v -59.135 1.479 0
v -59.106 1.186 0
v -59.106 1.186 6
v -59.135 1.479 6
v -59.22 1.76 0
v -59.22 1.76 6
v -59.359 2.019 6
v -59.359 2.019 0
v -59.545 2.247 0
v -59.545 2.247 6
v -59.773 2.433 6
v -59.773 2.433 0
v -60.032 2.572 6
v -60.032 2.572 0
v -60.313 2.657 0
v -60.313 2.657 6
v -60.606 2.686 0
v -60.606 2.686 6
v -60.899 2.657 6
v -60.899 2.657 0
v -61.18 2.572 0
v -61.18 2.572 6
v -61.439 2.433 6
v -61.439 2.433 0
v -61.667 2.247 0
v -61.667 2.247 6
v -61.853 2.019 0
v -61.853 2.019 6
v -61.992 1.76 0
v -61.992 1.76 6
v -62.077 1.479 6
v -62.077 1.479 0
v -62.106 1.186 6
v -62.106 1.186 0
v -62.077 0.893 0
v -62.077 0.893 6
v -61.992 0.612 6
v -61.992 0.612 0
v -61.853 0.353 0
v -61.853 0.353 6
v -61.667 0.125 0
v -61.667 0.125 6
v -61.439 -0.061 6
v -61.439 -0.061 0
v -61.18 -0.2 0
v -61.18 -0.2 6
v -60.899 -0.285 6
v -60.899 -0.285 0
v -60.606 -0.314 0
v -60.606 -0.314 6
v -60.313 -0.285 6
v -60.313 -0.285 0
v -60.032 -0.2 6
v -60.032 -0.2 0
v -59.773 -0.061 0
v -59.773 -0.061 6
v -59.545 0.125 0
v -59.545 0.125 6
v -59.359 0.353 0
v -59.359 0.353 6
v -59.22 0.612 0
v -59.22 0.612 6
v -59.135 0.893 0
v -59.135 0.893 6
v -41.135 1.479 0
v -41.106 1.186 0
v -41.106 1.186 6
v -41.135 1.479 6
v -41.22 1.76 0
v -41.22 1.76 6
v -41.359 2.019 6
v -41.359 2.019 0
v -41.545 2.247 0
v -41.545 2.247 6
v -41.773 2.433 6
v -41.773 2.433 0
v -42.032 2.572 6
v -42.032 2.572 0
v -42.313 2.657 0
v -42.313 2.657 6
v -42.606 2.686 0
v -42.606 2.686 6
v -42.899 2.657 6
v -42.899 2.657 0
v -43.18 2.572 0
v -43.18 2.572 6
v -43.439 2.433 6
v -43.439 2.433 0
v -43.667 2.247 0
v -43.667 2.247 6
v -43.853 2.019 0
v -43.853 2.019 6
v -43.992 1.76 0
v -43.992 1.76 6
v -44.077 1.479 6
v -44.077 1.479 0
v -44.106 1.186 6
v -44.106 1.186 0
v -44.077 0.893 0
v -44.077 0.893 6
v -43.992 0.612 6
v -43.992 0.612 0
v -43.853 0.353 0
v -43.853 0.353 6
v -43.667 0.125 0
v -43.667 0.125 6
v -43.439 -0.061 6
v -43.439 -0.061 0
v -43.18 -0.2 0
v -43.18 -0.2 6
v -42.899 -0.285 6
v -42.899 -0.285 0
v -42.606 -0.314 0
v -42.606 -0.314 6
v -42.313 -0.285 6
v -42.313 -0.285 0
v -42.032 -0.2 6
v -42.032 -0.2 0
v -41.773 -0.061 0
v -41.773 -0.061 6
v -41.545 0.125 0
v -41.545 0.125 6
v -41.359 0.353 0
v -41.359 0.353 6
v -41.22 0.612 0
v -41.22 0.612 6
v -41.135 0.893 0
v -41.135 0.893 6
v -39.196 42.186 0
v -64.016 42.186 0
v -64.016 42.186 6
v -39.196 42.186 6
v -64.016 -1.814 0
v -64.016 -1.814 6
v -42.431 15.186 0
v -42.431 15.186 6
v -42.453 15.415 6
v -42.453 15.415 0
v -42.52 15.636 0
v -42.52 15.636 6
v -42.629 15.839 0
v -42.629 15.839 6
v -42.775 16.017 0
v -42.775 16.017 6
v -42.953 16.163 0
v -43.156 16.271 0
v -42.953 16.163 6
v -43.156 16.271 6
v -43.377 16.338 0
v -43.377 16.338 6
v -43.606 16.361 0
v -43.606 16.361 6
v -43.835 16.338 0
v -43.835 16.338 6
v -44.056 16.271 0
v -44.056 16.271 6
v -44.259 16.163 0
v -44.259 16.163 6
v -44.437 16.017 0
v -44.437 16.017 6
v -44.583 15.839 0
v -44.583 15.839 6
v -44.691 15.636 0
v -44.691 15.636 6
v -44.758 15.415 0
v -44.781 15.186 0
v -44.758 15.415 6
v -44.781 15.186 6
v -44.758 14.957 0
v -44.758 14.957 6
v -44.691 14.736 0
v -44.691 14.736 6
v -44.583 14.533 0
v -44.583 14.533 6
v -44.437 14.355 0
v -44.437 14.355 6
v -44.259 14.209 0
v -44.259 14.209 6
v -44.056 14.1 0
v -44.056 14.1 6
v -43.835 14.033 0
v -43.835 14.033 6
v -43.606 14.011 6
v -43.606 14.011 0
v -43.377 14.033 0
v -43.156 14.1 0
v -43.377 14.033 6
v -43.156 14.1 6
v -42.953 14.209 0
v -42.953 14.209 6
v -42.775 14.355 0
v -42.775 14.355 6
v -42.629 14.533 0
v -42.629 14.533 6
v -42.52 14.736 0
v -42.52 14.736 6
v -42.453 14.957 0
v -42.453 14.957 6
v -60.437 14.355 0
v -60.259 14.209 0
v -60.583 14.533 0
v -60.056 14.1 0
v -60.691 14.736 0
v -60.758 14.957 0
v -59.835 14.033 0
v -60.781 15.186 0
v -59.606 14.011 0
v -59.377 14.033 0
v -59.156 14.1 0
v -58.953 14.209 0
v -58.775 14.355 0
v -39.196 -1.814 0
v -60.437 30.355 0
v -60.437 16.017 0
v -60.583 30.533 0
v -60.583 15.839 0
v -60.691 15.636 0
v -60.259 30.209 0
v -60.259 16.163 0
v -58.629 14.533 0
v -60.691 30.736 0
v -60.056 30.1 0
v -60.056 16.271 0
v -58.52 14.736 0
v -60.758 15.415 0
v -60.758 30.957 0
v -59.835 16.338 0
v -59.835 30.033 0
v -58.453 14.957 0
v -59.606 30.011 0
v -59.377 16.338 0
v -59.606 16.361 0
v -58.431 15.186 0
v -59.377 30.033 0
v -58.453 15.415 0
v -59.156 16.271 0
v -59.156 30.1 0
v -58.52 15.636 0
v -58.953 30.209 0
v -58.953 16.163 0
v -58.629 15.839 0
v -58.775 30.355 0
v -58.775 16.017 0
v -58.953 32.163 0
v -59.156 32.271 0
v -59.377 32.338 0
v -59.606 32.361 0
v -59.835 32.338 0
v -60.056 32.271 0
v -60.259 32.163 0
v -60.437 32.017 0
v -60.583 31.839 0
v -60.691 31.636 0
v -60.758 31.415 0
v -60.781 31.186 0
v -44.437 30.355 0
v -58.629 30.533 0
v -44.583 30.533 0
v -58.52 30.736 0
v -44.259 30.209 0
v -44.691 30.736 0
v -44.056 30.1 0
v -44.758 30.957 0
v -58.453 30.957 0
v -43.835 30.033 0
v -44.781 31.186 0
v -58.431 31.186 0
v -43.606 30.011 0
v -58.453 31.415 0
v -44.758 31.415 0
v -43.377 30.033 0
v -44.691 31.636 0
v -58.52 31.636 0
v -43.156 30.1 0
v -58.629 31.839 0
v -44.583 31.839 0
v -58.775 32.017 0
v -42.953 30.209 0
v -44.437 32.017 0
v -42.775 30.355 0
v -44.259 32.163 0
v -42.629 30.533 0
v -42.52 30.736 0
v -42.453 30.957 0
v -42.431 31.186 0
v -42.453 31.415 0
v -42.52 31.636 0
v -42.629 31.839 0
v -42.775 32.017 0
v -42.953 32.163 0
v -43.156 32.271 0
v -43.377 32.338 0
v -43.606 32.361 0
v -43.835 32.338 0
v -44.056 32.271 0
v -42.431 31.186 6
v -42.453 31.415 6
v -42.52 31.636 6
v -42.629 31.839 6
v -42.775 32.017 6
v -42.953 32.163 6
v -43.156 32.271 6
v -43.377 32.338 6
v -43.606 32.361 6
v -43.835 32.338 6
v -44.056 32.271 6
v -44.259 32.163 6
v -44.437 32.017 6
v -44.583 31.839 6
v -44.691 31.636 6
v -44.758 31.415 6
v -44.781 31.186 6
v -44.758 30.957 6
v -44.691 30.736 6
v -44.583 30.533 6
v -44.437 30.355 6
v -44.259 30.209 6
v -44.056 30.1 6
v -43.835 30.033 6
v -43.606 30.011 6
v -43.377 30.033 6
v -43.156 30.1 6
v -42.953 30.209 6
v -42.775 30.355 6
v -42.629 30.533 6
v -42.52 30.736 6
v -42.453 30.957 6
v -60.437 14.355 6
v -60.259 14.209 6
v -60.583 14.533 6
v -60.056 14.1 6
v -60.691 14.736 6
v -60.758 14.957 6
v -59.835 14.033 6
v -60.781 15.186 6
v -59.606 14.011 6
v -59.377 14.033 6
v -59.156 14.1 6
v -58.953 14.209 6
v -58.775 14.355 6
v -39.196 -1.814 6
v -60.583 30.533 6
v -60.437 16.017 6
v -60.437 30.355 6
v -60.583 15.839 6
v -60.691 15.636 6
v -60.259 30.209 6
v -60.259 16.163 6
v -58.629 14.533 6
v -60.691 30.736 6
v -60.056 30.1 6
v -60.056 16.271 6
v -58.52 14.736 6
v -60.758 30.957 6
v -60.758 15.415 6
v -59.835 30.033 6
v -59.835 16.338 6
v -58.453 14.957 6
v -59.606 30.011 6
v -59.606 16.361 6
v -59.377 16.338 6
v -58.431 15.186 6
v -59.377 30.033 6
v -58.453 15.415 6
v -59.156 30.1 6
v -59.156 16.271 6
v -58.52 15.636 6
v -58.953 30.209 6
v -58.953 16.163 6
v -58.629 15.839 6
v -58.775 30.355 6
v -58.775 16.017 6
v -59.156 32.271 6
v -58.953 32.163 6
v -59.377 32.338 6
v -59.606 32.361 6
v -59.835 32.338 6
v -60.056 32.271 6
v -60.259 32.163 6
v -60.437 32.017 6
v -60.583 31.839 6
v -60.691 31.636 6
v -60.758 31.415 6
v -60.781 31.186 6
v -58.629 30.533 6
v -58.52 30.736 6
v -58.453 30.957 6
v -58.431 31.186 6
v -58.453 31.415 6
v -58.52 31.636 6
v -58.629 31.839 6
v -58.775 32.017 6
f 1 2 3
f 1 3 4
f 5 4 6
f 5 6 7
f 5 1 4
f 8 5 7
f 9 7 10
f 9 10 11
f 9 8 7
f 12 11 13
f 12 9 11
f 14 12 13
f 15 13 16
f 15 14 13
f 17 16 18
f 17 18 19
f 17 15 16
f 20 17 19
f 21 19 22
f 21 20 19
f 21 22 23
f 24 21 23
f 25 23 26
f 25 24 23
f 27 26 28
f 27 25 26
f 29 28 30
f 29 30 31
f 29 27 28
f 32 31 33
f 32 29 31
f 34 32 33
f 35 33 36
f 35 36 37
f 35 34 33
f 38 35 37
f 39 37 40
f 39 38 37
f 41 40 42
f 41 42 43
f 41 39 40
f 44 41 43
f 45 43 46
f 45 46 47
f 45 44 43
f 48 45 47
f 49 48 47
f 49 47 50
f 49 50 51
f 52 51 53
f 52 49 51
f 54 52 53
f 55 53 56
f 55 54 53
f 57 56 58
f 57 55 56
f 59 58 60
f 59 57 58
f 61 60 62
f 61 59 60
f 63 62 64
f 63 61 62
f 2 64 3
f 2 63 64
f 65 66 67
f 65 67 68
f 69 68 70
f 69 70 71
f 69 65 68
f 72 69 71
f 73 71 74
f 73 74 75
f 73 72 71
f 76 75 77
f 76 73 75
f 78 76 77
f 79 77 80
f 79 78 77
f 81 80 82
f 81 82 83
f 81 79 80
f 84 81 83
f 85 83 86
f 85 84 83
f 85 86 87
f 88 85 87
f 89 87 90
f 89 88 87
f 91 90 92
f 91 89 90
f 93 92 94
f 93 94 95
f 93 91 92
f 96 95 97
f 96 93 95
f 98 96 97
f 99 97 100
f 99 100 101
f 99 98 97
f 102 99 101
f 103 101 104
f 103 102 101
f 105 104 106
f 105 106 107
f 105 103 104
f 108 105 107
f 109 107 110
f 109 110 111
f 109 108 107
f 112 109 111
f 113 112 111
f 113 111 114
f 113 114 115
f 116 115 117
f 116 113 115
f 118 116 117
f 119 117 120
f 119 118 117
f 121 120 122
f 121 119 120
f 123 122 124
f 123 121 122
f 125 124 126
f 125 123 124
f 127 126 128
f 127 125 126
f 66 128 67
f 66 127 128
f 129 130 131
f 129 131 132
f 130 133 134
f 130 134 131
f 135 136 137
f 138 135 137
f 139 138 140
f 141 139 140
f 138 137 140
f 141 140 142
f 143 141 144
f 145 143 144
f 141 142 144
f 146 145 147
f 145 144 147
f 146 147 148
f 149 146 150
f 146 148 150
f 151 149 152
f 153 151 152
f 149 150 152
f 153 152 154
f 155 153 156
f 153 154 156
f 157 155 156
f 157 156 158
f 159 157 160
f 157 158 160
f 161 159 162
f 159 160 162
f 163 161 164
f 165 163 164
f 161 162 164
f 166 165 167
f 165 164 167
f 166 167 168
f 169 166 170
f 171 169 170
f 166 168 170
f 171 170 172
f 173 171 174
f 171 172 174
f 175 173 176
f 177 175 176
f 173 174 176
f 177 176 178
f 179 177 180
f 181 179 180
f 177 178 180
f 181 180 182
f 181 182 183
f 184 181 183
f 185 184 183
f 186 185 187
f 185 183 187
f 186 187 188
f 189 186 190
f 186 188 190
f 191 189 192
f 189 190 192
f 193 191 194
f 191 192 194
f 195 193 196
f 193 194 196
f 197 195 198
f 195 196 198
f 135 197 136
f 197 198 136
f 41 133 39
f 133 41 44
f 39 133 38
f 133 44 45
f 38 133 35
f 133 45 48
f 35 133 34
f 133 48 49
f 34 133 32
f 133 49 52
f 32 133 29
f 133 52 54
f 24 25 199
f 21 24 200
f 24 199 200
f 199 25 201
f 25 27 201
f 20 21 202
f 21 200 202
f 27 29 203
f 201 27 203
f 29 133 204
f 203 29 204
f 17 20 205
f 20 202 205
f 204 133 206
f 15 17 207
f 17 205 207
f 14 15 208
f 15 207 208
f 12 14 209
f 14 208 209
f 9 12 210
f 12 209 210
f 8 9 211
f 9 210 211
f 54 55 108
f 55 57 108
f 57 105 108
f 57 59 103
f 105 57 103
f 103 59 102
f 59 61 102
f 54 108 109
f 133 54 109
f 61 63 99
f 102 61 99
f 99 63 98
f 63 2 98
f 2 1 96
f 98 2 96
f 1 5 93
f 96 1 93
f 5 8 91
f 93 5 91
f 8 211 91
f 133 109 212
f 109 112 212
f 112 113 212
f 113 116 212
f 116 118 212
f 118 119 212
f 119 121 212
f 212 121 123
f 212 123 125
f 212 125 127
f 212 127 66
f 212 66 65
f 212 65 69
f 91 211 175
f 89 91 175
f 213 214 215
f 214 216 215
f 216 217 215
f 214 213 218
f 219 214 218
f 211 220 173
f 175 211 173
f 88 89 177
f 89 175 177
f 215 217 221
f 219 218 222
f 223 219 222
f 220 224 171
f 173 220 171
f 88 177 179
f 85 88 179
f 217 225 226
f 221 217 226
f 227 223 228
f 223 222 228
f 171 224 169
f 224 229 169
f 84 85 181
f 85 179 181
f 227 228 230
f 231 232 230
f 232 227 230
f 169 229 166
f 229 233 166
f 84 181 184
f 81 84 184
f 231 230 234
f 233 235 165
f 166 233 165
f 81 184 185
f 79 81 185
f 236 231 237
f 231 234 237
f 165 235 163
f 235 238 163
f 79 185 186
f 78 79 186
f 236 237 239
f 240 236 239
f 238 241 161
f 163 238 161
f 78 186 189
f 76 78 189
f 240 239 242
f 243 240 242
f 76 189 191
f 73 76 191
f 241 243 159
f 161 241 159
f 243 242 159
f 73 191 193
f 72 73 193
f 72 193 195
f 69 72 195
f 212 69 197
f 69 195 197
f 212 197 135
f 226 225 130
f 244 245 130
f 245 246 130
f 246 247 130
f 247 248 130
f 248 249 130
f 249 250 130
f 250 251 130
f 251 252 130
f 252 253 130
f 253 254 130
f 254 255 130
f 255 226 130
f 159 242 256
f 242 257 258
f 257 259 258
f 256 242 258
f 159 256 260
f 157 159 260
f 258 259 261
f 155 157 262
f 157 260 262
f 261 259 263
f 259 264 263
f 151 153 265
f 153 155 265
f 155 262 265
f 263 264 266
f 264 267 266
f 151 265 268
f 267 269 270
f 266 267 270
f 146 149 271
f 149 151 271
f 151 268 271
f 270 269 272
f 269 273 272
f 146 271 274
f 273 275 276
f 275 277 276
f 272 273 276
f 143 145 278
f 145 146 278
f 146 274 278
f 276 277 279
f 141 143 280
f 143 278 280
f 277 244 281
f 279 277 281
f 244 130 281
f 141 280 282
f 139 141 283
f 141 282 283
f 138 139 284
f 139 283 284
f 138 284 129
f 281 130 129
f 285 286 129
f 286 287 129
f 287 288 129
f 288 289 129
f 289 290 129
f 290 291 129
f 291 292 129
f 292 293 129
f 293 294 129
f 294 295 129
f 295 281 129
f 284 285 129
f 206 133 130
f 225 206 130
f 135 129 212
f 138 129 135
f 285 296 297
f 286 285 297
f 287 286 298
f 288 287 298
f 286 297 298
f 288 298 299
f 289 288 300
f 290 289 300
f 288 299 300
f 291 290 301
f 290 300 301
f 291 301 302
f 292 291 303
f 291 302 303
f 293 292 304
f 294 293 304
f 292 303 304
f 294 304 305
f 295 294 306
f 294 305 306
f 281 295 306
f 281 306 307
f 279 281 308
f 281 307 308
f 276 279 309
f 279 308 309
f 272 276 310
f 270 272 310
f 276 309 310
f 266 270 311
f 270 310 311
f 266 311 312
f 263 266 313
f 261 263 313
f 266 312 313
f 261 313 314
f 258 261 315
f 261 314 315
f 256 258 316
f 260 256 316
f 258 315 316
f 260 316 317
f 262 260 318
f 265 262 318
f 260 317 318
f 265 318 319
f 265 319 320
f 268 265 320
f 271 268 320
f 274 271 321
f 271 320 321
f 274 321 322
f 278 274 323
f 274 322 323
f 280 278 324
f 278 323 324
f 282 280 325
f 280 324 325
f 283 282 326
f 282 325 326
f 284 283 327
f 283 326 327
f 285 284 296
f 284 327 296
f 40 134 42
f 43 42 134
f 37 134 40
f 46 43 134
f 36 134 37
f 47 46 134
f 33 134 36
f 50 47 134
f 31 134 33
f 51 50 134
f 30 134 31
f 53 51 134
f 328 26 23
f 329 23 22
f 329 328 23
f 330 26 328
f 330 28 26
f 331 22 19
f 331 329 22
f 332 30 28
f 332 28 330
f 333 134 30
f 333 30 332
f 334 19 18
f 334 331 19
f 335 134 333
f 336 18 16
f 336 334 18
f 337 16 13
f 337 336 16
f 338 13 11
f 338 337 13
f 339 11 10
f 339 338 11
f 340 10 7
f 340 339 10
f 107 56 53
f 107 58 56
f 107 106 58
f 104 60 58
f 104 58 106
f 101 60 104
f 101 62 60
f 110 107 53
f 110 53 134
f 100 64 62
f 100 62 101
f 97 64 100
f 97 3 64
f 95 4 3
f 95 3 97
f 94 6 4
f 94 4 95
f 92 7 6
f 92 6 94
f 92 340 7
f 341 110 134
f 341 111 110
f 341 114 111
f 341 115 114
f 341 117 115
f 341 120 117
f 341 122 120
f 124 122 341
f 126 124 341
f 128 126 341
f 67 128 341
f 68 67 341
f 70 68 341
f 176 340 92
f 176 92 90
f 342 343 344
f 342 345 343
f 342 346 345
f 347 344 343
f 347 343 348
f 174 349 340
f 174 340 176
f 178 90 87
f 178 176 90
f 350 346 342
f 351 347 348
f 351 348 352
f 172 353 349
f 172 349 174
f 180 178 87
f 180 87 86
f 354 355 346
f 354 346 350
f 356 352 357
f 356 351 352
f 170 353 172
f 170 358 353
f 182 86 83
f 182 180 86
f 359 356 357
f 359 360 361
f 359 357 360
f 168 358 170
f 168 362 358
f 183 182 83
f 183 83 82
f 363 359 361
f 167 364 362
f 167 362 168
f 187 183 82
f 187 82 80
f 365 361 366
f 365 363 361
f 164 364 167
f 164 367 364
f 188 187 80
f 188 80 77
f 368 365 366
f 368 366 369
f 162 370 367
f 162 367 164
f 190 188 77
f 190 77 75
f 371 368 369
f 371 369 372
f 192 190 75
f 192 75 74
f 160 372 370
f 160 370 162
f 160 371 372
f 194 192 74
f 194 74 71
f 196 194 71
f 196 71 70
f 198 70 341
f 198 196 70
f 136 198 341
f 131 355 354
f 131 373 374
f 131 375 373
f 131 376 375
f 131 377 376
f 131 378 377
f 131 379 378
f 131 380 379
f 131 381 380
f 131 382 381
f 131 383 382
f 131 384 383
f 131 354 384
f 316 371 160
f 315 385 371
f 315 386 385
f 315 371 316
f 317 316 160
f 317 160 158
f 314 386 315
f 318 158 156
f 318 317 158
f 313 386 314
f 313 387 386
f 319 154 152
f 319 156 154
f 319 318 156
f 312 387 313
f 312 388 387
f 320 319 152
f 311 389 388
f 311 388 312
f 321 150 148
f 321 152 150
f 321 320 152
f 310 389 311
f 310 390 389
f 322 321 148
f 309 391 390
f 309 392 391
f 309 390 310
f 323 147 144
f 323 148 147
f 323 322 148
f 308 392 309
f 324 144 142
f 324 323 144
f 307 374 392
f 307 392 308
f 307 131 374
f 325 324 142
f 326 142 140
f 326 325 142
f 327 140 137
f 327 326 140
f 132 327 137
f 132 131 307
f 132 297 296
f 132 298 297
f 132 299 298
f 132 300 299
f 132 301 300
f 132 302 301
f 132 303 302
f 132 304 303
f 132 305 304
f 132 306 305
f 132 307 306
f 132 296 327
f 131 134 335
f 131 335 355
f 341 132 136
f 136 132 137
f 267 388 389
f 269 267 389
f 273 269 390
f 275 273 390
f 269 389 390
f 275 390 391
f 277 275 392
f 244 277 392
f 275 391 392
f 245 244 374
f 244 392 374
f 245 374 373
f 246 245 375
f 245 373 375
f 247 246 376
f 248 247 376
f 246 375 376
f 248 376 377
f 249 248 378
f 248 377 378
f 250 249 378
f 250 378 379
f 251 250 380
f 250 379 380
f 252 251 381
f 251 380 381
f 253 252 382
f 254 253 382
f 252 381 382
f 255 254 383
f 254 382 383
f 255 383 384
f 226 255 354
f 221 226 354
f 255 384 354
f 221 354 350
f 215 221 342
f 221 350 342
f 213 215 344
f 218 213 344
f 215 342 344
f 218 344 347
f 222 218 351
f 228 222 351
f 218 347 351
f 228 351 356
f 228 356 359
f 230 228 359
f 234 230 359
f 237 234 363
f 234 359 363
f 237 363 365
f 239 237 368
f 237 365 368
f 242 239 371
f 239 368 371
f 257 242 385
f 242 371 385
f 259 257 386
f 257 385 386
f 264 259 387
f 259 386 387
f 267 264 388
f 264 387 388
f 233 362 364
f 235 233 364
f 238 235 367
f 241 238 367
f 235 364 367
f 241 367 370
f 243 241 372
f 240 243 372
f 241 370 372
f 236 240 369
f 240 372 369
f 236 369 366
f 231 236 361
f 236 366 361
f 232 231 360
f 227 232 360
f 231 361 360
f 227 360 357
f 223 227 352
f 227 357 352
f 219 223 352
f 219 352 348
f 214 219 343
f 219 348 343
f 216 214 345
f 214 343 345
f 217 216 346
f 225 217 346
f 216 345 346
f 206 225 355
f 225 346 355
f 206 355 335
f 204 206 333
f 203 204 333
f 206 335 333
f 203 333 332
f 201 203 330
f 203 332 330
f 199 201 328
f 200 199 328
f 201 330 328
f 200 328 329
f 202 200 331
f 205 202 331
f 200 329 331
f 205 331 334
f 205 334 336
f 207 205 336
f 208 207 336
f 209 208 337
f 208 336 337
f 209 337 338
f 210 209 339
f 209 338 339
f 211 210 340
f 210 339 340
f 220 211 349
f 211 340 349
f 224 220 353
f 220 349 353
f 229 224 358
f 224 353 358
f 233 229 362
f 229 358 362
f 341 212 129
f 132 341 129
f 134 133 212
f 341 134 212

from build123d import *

# Parameters (mm, degrees)
ESQUISSE1_W             = 24.82
ESQUISSE1_H             = 44
ESQUISSE1_R             = 1.5
BOSS_EXTRU_1_DEPTH      = 6
ESQUISSE2_R             = 1.175
ENL_V_MAT_EXTRU_1_DEPTH = 6


with BuildPart() as part:
    # Esquisse1 → Boss.-Extru.1 (new body)
    with BuildSketch(Plane.XY):
        with Locations((-51.605872064, 20.185897225)):
            Rectangle(ESQUISSE1_W, ESQUISSE1_H)
        with Locations((-60.605872064, 1.185897225)):
            Circle(ESQUISSE1_R, mode=Mode.SUBTRACT)
        with Locations((-42.605872064, 1.185897225)):
            Circle(ESQUISSE1_R, mode=Mode.SUBTRACT)
    extrude(amount=BOSS_EXTRU_1_DEPTH)

    # Esquisse2 → Enlèv. mat.-Extru.1 (cut)
    with BuildSketch(Plane.XY.offset(6)):
        with Locations((-43.605872064, 31.185897225)):
            Circle(ESQUISSE2_R)
        with Locations((-59.605872064, 31.185897225)):
            Circle(ESQUISSE2_R)
        with Locations((-59.605872064, 15.185897225)):
            Circle(ESQUISSE2_R)
        with Locations((-43.605872064, 15.185897225)):
            Circle(ESQUISSE2_R)
    extrude(amount=-ENL_V_MAT_EXTRU_1_DEPTH, mode=Mode.SUBTRACT)


solid = part.part
